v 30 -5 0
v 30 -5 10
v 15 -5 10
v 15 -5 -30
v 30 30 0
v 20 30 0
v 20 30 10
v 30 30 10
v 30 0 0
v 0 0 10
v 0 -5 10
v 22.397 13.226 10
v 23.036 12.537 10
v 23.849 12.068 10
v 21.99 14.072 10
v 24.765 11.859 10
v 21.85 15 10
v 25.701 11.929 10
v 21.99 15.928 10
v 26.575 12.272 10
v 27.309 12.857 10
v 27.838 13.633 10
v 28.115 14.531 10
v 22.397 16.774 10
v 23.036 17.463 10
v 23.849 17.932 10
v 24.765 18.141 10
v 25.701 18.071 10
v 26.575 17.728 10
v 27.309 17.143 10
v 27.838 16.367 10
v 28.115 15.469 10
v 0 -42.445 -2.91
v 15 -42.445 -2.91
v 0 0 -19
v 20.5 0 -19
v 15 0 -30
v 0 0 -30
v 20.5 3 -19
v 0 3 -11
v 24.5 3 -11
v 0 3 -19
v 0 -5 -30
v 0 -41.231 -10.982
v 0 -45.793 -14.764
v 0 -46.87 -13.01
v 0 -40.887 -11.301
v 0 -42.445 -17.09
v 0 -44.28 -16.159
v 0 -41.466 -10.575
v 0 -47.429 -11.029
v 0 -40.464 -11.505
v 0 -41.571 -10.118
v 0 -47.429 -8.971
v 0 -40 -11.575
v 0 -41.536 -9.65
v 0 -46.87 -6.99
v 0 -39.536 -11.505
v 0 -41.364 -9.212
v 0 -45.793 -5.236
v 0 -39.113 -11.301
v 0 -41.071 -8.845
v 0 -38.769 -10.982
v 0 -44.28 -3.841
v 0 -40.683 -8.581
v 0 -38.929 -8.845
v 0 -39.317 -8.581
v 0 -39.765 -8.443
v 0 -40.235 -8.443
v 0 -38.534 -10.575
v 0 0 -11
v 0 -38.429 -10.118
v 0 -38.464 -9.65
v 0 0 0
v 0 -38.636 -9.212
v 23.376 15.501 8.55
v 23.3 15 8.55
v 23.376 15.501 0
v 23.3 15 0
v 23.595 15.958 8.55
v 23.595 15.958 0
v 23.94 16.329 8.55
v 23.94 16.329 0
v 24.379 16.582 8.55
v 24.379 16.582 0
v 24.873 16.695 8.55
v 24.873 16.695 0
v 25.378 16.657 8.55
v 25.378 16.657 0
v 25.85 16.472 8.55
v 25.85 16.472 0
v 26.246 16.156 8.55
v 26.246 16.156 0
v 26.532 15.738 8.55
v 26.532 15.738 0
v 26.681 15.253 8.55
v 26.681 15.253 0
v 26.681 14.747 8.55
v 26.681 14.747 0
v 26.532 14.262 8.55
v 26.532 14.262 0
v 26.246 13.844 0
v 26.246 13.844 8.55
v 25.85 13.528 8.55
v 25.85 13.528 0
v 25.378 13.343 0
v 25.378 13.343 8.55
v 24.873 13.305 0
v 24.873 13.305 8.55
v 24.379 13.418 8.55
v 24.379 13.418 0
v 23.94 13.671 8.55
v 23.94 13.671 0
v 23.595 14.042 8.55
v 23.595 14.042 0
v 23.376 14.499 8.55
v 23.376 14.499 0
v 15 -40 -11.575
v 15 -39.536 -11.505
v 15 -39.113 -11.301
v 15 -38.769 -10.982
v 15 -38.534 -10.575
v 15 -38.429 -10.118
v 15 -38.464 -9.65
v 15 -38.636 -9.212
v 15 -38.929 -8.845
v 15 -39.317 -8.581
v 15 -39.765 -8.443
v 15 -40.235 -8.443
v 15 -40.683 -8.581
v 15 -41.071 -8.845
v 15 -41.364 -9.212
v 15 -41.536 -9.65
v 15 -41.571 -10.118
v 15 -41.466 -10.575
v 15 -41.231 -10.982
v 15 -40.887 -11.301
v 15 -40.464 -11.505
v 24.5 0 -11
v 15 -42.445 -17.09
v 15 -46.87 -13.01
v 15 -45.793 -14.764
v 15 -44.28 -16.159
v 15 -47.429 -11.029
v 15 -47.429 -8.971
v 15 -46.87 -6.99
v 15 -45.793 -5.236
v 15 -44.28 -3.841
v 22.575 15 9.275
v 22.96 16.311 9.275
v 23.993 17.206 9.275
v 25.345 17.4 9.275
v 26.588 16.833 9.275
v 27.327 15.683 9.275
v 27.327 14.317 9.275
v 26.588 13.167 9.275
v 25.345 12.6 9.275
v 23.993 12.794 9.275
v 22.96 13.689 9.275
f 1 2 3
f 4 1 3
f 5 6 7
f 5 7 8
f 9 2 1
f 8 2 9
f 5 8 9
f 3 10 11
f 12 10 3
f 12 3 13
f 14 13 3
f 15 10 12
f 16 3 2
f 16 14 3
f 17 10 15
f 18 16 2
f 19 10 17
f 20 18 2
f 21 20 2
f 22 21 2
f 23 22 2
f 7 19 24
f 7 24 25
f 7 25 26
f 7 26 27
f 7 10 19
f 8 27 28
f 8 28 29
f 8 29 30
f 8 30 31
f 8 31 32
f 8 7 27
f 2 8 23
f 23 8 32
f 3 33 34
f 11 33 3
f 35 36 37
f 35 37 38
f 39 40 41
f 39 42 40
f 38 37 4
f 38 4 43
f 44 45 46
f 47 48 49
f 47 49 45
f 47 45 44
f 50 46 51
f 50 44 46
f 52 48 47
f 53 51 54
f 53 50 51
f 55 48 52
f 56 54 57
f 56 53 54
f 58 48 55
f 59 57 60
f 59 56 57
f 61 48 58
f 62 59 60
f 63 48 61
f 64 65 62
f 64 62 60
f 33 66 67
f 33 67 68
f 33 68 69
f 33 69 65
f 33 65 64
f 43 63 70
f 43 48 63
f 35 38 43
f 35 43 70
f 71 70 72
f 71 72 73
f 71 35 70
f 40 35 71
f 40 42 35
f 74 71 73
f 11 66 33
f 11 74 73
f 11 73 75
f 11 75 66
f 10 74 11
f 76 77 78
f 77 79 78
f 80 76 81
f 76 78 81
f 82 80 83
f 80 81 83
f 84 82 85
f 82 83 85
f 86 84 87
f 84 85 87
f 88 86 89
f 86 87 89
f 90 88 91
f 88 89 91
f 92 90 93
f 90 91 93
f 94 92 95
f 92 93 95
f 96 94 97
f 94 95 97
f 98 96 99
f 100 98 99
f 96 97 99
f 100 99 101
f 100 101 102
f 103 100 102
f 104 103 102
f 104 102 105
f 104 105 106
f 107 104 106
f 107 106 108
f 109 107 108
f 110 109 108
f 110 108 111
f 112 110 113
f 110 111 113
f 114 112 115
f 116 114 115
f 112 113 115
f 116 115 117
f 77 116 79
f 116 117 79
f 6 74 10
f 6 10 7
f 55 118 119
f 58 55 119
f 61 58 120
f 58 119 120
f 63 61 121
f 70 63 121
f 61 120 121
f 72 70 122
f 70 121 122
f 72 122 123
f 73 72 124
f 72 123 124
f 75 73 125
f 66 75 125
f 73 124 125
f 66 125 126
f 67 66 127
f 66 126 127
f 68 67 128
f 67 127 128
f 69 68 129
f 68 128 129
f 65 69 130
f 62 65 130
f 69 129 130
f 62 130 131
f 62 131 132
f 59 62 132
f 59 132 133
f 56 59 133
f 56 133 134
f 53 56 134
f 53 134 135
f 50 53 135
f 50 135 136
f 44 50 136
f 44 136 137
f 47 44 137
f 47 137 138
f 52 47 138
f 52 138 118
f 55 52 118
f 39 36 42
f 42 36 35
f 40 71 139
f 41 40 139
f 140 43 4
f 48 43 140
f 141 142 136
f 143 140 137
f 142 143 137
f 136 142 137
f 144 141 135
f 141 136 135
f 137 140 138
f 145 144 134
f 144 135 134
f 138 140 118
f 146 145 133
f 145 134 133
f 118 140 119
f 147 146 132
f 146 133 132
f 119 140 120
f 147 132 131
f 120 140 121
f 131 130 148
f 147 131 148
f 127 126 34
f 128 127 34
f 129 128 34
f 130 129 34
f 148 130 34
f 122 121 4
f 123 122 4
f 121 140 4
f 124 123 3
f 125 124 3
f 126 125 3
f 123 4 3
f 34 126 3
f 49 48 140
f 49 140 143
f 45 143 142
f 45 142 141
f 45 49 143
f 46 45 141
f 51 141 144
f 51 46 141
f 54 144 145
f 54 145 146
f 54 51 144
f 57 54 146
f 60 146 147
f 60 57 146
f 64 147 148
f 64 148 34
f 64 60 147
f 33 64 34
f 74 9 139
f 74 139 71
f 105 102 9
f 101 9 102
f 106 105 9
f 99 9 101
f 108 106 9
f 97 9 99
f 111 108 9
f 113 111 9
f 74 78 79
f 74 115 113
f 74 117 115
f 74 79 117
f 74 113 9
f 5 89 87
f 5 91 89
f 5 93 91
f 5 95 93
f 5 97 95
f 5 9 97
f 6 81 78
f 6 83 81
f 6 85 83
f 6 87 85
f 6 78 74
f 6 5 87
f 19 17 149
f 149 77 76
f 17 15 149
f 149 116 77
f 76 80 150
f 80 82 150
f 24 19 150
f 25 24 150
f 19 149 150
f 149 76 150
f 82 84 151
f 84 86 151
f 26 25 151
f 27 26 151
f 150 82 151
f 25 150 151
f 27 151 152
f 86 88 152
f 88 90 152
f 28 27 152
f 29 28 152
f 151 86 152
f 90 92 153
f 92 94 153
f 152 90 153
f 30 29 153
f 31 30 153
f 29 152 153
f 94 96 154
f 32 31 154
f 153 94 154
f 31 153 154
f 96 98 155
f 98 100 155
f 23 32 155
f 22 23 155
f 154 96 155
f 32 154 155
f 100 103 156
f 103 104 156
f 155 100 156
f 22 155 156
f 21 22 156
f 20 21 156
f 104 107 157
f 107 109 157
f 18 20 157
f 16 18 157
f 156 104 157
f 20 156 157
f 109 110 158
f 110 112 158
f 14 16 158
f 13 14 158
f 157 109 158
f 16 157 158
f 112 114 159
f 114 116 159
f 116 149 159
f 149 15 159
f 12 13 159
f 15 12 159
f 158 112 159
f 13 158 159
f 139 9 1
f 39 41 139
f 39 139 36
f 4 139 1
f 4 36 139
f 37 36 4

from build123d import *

# Parameters (mm, degrees)
EXTRUDE_1_DEPTH              = 10
EXTRUDE_2_DEPTH              = 5
EXTRUDE_3_DEPTH              = 15
EXTRUDE_4_DEPTH              = 3
HOLE_WIZARD_M3_1_D           = 3.4
HOLE_WIZARD_M3_1_CSINK_D     = 6.3
HOLE_WIZARD_M3_1_CSINK_ANGLE = 90
HOLE_WIZARD_M3_1_2_D         = 3.15


with BuildPart() as part:
    # 草图1 → 凸台-拉伸1 (new body)
    with BuildSketch(Plane.XY):
        Polygon((0, 0), (20, 30), (30, 30), (30, 0), align=None)
    extrude(amount=EXTRUDE_1_DEPTH)

    # 草图2 → 凸台-拉伸2 (add)
    with BuildSketch(Plane.XZ):
        Polygon((0, 10), (30, 10), (30, 0), (15, -30), (0, -30), align=None)
    extrude(amount=EXTRUDE_2_DEPTH)

    # 草图3 → 凸台-拉伸3 (add)
    with BuildSketch(Plane.ZY):
        with BuildLine():
            Line((-30, -5), (-17.090434036, -42.444533735))
            ThreePointArc((-17.090434036, -42.444533735), (-10, -47.5), (-2.909565964, -42.444533735))
            Line((-2.909565964, -42.444533735), (10, -5))
            Line((10, -5), (-30, -5))
        make_face()
    extrude(amount=-EXTRUDE_3_DEPTH)

    # 草图4 → 凸台-拉伸4 (add)
    with BuildSketch(Plane(origin=(0, 0, 0), x_dir=(1, 0, 0), z_dir=(0, 1, 0))):
        Polygon((0, 11), (24.5, 11), (20.5, 19), (0, 19), align=None)
    extrude(amount=EXTRUDE_4_DEPTH)

    # Hole Wizard M3 _1 (through all)
    with Locations(Plane.XY.offset(10)):
        with Locations((25, 15)):
            CounterSinkHole(HOLE_WIZARD_M3_1_D / 2, HOLE_WIZARD_M3_1_CSINK_D / 2, counter_sink_angle=HOLE_WIZARD_M3_1_CSINK_ANGLE)

    # Hole Wizard M3 _1 2 (through all)
    with Locations(Plane.ZY):
        with Locations((-10, -40)):
            Hole(HOLE_WIZARD_M3_1_2_D / 2)


solid = part.part
